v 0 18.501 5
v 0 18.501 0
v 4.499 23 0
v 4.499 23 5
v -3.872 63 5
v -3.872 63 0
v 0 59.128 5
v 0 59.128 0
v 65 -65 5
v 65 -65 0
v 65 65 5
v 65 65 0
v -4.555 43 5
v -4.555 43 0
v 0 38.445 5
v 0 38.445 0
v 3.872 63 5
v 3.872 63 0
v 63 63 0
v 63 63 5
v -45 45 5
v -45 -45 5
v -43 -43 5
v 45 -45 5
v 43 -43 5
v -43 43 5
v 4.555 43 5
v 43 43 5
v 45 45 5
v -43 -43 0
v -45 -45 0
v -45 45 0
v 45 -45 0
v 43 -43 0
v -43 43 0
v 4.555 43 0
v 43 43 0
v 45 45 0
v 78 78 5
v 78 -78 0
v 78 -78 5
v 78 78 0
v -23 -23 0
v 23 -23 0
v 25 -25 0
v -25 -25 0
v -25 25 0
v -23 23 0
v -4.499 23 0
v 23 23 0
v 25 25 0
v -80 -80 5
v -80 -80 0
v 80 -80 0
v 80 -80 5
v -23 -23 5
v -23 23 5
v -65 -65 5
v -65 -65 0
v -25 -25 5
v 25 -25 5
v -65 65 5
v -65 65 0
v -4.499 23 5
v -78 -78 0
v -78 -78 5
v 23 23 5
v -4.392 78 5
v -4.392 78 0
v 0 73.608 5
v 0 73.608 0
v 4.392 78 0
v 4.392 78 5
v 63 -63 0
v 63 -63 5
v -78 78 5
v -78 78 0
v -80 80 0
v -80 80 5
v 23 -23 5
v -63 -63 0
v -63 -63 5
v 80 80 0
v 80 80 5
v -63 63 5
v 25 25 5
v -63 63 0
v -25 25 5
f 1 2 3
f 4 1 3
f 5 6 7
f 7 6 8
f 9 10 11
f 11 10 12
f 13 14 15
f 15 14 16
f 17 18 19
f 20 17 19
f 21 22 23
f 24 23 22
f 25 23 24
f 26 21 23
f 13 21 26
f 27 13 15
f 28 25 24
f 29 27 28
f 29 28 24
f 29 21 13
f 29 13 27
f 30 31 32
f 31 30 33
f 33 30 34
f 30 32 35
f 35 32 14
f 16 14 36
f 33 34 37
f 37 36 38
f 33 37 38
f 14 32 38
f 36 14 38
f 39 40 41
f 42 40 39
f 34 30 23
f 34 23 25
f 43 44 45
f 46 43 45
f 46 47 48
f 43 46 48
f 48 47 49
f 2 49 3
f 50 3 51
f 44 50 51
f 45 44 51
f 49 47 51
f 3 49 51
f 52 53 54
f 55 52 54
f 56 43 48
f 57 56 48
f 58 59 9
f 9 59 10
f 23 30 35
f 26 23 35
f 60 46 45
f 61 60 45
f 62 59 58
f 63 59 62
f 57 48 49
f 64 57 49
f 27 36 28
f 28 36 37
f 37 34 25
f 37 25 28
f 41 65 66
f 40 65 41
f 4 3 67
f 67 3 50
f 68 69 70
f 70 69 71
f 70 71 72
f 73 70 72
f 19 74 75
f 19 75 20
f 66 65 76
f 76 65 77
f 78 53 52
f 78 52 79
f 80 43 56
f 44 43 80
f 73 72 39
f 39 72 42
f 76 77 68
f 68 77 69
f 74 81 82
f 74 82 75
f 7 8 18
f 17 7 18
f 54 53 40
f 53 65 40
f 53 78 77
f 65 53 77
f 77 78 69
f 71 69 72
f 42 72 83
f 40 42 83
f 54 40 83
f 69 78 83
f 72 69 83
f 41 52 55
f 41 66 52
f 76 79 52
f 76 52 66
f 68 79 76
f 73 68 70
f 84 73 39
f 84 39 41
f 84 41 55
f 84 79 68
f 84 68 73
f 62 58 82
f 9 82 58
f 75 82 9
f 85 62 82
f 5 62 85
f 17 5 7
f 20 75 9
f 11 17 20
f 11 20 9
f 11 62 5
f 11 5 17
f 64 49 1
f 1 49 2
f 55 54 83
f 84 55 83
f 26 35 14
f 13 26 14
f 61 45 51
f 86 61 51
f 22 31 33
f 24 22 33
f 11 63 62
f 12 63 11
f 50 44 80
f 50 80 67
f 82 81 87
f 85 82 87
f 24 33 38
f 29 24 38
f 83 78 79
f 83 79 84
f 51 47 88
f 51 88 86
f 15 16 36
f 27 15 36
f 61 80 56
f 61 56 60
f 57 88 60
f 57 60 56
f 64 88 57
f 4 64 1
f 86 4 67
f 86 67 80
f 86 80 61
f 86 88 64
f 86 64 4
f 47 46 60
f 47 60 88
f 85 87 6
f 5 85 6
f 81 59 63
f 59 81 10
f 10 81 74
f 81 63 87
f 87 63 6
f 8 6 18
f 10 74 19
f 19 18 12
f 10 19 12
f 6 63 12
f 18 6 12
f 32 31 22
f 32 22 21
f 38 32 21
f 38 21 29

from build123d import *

# Parameters (mm, degrees)
F0_W     = 160
F0_H     = 160
F0_W_2   = 156
F0_H_2   = 156
F1_DEPTH = 5
F0_W_3   = 130
F0_H_3   = 130
F0_W_4   = 126
F0_H_4   = 126
F0_W_5   = 90
F0_H_5   = 90
F0_W_6   = 86
F0_H_6   = 86
F0_W_7   = 50
F0_H_7   = 50
F0_W_8   = 46
F0_H_8   = 46.0000012871
F3_DEPTH = 5


with BuildPart() as f1:
    # F0 (on Top) → F1 (new body)
    with BuildSketch(Plane.XY):
        Rectangle(F0_W, F0_H)
        Rectangle(F0_W_2, F0_H_2, mode=Mode.SUBTRACT)
    extrude(amount=F1_DEPTH)

    # F2 (on Top) → F3 (join)
    with BuildSketch(Plane.XY):
        Polygon((0, 73.6079147614), (0, 78.6079147614), (-5.1205901883, 78.7285049497), align=None)
        Polygon((5, 78.6079147614), (0, 78.6079147614), (0, 73.6079147614), align=None)
    extrude(amount=F3_DEPTH)


with BuildPart() as f1b:
    # F0 (on Top) → F1, piece 2 (new body)
    with BuildSketch(Plane.XY):
        Rectangle(F0_W_3, F0_H_3)
        Rectangle(F0_W_4, F0_H_4, mode=Mode.SUBTRACT)
    extrude(amount=F1_DEPTH)

    # F2 (on Top) → F3, piece 2 (join)
    with BuildSketch(Plane.XY):
        Polygon((4.4469106392, 63.5754074351), (0, 64.1284967959), (0, 59.1284967959), align=None)
        Polygon((0, 59.1284967959), (0, 64.1284967959), (-4.4469106392, 63.5754074351), align=None)
    extrude(amount=F3_DEPTH)


with BuildPart() as f1c:
    # F0 (on Top) → F1, piece 3 (new body)
    with BuildSketch(Plane.XY):
        Rectangle(F0_W_5, F0_H_5)
        Rectangle(F0_W_6, F0_H_6, mode=Mode.SUBTRACT)
    extrude(amount=F1_DEPTH)

    # F2 (on Top) → F3, piece 3 (join)
    with BuildSketch(Plane.XY):
        Polygon((0, 38.445033133), (0, 43.445033133), (-5.3175765089, 43.7626096419), align=None)
        Polygon((5, 43.445033133), (0, 43.445033133), (0, 38.445033133), align=None)
    extrude(amount=F3_DEPTH)


with BuildPart() as f1d:
    # F0 (on Top) → F1, piece 4 (new body)
    with BuildSketch(Plane.XY):
        Rectangle(F0_W_7, F0_H_7)
        Rectangle(F0_W_8, F0_H_8, mode=Mode.SUBTRACT)
    extrude(amount=F1_DEPTH)

    # F2 (on Top) → F3, piece 4 (join)
    with BuildSketch(Plane.XY):
        Polygon((0, 18.5014363378), (0, 23.5014363378), (-5, 23.5014363378), align=None)
        Polygon((4.5980428482, 23.0994791861), (0, 23.5014363378), (0, 18.5014363378), align=None)
    extrude(amount=F3_DEPTH)


solid = Compound([f1.part, f1b.part, f1c.part, f1d.part])
